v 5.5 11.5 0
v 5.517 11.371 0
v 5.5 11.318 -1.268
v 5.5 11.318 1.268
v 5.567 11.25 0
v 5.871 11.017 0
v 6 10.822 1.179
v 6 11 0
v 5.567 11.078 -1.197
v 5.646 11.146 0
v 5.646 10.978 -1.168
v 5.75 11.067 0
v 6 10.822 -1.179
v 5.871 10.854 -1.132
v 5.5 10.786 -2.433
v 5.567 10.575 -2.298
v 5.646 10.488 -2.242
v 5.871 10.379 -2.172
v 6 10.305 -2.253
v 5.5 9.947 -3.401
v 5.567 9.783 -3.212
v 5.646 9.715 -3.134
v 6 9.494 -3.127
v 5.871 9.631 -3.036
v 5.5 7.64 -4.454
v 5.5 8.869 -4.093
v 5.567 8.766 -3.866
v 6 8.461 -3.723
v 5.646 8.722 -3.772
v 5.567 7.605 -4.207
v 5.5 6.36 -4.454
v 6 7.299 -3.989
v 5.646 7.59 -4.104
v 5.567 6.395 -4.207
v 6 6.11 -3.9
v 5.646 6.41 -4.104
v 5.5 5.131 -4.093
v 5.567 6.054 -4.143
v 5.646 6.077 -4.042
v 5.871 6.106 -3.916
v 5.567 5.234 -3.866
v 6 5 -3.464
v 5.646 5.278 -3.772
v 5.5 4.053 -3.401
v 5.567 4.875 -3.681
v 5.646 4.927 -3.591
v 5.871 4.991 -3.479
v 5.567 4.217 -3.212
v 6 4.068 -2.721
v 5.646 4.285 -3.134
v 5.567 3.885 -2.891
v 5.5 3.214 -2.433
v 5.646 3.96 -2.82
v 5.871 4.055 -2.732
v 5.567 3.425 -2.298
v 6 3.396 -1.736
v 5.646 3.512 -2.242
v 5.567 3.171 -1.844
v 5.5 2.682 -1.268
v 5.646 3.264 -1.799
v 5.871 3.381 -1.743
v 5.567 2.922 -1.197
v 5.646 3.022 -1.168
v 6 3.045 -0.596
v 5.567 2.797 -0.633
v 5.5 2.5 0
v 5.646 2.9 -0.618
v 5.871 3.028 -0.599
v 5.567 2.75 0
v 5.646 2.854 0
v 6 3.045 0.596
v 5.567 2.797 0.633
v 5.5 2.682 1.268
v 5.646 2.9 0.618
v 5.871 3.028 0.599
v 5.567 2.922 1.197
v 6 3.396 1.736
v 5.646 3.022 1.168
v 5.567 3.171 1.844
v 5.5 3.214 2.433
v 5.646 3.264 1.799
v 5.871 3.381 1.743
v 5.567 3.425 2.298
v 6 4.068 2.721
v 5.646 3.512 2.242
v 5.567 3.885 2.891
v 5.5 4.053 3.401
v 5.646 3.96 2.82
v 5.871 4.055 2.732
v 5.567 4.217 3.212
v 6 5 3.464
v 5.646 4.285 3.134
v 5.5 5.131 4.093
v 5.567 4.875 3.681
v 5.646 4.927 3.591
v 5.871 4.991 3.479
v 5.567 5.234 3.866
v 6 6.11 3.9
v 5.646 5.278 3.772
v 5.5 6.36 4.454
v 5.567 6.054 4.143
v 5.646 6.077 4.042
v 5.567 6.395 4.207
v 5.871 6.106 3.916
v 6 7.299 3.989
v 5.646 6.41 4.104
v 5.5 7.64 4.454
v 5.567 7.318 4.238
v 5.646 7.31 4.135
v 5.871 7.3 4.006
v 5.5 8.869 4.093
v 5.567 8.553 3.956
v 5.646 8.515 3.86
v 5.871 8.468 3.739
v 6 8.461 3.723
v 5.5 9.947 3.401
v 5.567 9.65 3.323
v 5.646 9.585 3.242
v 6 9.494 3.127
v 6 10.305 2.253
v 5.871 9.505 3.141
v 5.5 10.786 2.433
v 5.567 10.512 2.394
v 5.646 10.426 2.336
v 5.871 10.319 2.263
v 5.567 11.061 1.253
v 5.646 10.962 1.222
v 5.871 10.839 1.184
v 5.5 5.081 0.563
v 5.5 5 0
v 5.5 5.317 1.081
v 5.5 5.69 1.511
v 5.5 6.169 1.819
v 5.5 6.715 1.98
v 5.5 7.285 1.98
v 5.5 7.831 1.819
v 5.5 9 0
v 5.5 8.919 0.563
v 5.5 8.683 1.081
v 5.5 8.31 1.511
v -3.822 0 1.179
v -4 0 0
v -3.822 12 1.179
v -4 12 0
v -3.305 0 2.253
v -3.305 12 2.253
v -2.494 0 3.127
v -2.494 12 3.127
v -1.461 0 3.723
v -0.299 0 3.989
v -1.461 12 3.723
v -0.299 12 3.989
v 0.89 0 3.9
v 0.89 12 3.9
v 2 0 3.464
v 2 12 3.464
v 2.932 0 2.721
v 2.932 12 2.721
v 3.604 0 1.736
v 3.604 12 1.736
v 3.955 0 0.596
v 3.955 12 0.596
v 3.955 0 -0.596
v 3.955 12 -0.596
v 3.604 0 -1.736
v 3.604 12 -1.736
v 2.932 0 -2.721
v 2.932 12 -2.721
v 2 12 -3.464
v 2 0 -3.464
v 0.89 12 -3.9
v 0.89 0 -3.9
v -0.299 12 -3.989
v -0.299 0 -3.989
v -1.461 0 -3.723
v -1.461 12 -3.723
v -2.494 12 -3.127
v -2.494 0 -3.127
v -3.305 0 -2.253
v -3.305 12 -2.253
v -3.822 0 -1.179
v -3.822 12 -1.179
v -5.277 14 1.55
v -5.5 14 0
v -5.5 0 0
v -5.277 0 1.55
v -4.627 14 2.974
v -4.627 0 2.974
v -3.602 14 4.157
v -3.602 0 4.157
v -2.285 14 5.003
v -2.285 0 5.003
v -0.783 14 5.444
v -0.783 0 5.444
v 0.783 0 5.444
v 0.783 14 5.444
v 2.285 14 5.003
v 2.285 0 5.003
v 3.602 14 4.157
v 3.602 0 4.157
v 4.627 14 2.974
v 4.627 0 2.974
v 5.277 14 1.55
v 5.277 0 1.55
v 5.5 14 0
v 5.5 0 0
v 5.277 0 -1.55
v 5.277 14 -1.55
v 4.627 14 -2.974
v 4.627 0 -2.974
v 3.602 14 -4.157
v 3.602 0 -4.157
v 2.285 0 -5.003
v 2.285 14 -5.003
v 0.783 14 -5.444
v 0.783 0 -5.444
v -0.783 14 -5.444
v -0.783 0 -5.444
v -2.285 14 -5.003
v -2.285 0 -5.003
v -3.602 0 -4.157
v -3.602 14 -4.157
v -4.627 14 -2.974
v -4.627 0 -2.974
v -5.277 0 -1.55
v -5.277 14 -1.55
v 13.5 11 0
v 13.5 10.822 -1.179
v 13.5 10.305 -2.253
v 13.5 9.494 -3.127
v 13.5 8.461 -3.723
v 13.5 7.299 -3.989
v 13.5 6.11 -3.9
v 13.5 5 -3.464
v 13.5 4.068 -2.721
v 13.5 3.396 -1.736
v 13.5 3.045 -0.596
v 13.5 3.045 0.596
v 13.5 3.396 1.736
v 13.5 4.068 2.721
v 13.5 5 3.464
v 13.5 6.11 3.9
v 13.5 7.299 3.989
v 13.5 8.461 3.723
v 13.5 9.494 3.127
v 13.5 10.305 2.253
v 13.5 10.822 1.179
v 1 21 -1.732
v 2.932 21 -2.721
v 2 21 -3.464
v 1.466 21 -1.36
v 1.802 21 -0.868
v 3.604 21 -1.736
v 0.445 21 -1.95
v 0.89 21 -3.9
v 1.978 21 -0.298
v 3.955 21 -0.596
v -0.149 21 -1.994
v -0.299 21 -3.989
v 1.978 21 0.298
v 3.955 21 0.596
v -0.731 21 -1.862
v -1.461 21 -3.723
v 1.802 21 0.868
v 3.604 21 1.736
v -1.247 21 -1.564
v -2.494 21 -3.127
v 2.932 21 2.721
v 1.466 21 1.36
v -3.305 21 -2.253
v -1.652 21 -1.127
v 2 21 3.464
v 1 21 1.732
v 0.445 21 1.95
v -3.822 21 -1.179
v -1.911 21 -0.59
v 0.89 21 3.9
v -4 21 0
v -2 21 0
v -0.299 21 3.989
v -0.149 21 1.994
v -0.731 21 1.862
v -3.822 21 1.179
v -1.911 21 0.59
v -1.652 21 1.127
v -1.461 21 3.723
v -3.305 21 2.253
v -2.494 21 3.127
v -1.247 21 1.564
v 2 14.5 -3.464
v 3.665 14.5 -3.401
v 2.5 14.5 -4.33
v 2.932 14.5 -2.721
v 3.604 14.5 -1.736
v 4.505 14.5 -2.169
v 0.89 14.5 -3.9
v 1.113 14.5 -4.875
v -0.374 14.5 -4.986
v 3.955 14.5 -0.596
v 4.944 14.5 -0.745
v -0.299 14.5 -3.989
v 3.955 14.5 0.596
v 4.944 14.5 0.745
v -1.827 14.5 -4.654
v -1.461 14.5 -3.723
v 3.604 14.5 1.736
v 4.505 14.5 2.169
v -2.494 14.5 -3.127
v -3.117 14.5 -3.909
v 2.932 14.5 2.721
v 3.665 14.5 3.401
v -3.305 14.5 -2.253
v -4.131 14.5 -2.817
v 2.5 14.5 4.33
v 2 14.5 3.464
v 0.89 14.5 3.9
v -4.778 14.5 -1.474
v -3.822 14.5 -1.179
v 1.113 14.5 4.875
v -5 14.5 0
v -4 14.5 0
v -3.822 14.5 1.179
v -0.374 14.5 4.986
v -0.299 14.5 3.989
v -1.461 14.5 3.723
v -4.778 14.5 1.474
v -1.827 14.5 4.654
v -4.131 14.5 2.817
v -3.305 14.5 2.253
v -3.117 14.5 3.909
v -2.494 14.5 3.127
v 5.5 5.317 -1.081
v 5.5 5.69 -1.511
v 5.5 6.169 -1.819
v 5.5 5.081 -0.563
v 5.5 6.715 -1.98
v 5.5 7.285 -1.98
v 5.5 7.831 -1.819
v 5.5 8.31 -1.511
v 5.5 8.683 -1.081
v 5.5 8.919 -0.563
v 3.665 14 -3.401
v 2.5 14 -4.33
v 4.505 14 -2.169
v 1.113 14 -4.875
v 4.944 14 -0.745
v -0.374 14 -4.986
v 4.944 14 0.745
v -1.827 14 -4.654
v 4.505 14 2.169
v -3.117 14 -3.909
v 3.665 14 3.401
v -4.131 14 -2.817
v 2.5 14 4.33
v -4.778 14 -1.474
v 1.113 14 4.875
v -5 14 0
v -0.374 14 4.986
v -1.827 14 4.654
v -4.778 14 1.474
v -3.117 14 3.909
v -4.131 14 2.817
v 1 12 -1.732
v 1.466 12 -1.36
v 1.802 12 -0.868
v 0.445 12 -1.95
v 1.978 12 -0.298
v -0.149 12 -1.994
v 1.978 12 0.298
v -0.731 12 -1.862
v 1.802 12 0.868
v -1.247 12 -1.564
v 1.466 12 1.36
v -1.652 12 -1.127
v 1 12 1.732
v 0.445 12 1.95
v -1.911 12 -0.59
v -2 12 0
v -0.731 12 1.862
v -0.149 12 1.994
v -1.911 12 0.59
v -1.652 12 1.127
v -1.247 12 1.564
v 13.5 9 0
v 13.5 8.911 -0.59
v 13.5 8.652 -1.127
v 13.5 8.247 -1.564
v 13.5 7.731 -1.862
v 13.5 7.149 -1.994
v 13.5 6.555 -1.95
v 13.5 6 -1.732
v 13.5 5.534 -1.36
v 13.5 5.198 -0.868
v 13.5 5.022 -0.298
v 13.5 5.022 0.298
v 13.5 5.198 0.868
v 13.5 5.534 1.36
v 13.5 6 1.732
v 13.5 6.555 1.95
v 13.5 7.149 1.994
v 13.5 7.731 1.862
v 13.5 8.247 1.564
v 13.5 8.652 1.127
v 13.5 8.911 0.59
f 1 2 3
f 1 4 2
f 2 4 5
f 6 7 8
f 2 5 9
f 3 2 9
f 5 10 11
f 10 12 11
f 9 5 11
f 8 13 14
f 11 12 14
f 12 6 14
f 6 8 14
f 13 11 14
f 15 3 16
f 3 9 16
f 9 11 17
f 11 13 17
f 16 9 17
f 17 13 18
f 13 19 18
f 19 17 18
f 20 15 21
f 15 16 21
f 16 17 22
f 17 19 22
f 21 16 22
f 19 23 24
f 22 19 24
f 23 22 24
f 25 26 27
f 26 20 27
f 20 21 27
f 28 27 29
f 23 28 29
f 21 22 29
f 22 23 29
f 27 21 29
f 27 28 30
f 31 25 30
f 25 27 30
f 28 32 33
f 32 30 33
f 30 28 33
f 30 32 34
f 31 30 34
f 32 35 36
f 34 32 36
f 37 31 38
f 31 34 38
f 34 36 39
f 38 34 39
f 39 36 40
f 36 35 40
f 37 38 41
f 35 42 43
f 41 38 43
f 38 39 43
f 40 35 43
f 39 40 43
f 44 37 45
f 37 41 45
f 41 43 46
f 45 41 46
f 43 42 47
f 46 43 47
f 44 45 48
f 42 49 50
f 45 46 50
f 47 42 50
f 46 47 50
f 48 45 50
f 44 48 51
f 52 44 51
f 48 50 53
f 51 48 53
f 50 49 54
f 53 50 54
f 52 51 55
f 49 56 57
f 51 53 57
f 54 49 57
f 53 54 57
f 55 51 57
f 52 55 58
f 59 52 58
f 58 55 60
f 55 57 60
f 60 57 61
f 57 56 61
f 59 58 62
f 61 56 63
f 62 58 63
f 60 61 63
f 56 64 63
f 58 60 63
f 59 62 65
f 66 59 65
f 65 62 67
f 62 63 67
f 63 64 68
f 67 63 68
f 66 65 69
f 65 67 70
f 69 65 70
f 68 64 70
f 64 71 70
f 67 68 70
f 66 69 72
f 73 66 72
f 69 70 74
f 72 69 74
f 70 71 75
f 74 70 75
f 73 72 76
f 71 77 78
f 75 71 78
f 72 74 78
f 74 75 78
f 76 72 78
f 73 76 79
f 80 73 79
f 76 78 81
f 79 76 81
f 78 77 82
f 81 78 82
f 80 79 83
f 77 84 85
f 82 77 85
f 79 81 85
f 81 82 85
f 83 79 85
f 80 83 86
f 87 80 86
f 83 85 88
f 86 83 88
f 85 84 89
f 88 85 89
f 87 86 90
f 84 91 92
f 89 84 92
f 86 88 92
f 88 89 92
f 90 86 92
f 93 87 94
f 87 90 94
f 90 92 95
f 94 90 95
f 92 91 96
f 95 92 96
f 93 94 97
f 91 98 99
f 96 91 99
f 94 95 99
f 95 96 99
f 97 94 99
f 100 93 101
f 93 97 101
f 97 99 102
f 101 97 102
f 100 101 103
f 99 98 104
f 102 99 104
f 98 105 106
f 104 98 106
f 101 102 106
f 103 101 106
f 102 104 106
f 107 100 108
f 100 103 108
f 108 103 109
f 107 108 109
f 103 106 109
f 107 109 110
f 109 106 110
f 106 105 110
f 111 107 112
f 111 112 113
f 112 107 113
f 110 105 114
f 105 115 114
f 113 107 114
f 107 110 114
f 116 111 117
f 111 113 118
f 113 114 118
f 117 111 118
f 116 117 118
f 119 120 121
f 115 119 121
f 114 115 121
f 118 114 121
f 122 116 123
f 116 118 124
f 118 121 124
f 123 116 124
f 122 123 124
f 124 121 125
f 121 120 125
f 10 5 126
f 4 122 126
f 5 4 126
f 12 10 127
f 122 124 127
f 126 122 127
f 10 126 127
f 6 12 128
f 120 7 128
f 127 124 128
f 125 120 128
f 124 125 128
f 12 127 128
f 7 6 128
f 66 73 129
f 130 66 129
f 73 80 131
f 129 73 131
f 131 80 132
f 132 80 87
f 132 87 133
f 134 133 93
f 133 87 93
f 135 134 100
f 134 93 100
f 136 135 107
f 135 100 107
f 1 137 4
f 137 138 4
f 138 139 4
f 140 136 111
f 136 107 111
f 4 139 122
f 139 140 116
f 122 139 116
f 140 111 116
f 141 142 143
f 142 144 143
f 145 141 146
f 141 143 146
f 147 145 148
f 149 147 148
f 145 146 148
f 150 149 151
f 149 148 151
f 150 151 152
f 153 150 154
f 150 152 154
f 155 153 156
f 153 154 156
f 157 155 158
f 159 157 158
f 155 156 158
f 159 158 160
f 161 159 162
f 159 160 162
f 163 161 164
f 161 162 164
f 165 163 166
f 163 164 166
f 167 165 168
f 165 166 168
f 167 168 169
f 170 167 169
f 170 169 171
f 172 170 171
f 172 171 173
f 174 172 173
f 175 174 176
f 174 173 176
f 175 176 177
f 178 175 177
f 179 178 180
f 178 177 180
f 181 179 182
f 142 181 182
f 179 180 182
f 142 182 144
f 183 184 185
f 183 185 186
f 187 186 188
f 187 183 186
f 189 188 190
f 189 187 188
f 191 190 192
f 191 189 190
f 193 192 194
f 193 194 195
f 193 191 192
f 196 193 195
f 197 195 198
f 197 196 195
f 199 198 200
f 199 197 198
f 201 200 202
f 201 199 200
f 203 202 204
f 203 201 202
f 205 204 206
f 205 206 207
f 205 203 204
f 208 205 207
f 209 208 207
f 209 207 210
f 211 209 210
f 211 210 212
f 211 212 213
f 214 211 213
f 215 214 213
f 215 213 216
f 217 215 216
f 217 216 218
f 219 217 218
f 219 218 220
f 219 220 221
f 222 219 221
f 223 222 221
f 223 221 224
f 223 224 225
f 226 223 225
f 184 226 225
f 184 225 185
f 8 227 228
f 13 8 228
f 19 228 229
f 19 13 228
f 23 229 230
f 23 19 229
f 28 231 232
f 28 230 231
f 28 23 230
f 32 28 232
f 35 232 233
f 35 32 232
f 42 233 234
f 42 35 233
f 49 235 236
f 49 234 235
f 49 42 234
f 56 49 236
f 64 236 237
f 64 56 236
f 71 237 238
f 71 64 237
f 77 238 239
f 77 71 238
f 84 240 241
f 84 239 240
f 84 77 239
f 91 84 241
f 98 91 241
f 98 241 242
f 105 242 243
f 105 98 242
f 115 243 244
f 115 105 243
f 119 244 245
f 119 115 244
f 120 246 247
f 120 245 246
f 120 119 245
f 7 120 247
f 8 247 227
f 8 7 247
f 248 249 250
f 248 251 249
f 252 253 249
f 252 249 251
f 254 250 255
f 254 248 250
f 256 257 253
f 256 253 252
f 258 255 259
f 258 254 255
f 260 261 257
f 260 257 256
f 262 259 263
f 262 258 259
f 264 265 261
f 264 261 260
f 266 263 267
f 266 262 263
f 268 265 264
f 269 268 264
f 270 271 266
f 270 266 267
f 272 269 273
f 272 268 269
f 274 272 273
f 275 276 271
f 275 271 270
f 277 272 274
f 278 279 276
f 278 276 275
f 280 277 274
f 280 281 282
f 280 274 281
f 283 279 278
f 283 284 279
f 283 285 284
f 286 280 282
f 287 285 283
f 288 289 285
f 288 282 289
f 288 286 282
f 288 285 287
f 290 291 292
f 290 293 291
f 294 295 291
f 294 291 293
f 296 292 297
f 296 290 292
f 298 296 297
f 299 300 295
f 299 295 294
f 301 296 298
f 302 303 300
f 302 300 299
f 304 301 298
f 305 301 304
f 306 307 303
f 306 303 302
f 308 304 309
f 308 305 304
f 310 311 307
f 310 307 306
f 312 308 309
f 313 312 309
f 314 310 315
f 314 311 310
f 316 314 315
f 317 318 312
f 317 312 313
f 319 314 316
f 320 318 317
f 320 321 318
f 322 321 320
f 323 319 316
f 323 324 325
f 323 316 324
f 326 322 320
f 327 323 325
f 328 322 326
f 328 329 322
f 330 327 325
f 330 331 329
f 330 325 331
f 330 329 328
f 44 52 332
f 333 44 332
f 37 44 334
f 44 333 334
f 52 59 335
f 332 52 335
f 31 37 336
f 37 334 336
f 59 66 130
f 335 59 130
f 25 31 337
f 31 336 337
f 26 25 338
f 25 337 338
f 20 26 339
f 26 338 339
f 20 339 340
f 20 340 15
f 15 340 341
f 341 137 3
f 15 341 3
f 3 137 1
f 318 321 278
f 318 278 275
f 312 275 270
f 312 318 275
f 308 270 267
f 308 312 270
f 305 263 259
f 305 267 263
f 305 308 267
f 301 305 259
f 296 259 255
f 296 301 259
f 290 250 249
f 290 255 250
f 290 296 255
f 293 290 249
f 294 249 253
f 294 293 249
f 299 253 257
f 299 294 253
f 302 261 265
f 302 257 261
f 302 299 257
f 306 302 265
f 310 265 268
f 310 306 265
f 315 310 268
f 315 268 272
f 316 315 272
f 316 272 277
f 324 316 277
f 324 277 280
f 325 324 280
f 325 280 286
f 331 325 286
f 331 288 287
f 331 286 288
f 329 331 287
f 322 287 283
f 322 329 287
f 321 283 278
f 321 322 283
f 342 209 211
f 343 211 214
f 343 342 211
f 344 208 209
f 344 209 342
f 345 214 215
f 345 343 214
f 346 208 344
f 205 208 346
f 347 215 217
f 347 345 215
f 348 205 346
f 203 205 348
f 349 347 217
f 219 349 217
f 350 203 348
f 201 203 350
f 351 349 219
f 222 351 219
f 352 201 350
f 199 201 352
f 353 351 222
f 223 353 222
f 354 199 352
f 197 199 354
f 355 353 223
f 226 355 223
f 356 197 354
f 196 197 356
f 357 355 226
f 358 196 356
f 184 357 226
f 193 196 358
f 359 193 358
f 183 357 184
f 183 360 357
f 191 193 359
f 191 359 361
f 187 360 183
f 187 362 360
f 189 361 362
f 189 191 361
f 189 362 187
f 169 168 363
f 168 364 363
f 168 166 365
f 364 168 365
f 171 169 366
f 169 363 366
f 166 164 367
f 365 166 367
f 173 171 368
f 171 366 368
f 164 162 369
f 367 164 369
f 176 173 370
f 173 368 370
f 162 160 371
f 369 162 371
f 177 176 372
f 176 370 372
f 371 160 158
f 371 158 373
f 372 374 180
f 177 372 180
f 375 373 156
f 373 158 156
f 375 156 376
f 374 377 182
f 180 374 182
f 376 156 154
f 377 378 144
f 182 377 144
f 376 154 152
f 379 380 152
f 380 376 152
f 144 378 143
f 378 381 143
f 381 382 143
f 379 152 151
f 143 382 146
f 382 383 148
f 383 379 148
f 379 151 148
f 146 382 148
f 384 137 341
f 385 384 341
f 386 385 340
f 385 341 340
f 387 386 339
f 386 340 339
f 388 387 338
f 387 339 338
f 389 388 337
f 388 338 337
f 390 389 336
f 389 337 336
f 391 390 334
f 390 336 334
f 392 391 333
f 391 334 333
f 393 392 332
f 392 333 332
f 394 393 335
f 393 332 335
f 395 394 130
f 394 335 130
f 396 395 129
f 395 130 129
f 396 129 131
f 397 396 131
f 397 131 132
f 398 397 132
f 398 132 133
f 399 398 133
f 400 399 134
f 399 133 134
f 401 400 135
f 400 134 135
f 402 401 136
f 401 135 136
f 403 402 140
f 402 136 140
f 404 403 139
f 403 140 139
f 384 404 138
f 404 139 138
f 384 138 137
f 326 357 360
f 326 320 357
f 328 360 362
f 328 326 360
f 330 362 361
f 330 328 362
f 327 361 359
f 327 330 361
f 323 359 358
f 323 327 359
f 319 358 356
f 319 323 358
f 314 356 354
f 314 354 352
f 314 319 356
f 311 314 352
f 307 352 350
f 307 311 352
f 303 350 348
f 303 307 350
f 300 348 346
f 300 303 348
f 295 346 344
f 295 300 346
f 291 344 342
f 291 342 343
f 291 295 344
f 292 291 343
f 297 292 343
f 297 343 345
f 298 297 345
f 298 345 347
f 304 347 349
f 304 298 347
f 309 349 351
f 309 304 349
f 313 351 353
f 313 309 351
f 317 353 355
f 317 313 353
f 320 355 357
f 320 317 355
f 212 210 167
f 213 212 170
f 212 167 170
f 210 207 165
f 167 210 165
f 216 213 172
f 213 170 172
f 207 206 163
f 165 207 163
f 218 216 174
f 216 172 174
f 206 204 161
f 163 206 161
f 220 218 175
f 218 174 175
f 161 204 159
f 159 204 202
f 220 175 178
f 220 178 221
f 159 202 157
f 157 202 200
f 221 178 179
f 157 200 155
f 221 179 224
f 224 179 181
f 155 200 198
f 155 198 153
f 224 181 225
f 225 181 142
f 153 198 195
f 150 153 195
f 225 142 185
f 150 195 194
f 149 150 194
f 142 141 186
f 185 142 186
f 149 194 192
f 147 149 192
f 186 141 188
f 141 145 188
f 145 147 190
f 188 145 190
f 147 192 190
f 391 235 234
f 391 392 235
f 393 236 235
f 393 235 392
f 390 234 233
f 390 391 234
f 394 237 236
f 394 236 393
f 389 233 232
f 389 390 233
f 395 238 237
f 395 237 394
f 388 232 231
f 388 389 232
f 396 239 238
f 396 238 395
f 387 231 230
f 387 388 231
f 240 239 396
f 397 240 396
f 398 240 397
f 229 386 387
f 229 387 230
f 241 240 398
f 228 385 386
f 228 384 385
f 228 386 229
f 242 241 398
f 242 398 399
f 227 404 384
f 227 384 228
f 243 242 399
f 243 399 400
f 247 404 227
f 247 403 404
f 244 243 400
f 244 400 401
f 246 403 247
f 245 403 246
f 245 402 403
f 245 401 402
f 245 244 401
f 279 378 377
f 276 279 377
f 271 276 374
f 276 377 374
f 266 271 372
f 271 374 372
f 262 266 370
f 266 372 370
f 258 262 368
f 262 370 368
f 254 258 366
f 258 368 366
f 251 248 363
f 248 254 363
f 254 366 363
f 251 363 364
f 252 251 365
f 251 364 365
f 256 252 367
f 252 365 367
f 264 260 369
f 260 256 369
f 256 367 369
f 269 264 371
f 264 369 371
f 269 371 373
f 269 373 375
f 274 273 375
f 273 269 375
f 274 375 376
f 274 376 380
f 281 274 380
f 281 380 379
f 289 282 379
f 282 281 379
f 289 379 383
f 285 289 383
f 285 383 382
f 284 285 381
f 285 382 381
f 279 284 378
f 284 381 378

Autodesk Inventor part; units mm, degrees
ref_plane "YZ Plane" through (0, 0, 0) normal (1, 0, 0) x (0, 1, 0)
ref_plane "XZ Plane" through (0, 0, 0) normal (0, 1, 0) x (-1, 0, 0)
ref_plane "XY Plane" through (0, 0, 0) normal (0, 0, 1) x (1, 0, 0)
sketch "Boceto1" plane through (0, 0, 0) normal (0, 0, 1) x (1, 0, 0)
  line L0 (0, 0) -> (0, 21)
  line L1 (0, 7) -> (13.5, 7)
  line L2 (-2, 21) -> (-4, 21)
  line L3 (-4, 21) -> (-4, 14)
  line L4 (-4, 14) -> (-2, 14)
  line L5 (-2, 21) -> (-2, 14)
  line L6 (-4, 14) -> (-5, 14)
  line L7 (-5, 14) -> (-5, 14.5)
  line L8 (-5, 14.5) -> (-4, 14.5)
  line L9 (-5.5, 0) -> (-5.5, 14)
  line L10 (0, 0) -> (-5.5, 0)
  line L11 (-5, 14) -> (-5.5, 14)
  line L12 (-4, 0) -> (-4, 7)
  line L13 (-4, 7) -> (-4, 12)
  line L14 (-4, 12) -> (-2, 12)
  line L15 (-2, 12) -> (-2, 14)
  line L16 (13.5, 11) -> (6, 11)
  line L17 (13.5, 11) -> (13.5, 9)
  line L18 (13.5, 9) -> (5.5, 9)
  line L19 (5.5, 9) -> (5.5, 11)
  line L20 (13.5, 9) -> (13.5, 7)
  line L21 (5.5, 11) -> (5.5, 11.5)
  arc A0 (5.5, 11.5) -> (6, 11) centre (6, 11.5) ccw
  dimension "d0" = 21
  dimension "d1" = 7
  dimension "d2" = 4
  dimension "d3" = 8
  dimension "d4" = 10
  dimension "d5" = 7
  dimension "d6" = 0.5
  dimension "d7" = 14
  dimension "d8" = 11
  dimension "d9" = 8
  dimension "d10" = 7
  dimension "d11" = 12
  dimension "d12" = 8
  dimension "d13" = 8
  dimension "d14" = 4
  dimension "d17" = 13.5
  dimension "d18" = 1
revolve "Revolución1" add sketch "Boceto1" angle 360 about axis through (0, 0, 0) along (0, 1, 0) contours L5 L4 L3 L2 | L15 L14 L13 L12 L10 L9 L11 L6 L4 | L3 L6 L7 L8
revolve "Revolución2" add sketch "Boceto1" angle 360 about axis through (0, 7, 0) along (1, 0, 0) contours L17 L18 L19 L21 A0 L16
thread "Rosca1" size "M8x1" class "6g" standard "ANSI Metric M Profile" length 7
thread "Rosca2" size "M8x1" class "6g" standard "ANSI Metric M Profile" length 7
thread "Rosca3" size "M8x1" class "6H" standard "ANSI Metric M Profile" length 7
properties part number "Hudson 1-56"
